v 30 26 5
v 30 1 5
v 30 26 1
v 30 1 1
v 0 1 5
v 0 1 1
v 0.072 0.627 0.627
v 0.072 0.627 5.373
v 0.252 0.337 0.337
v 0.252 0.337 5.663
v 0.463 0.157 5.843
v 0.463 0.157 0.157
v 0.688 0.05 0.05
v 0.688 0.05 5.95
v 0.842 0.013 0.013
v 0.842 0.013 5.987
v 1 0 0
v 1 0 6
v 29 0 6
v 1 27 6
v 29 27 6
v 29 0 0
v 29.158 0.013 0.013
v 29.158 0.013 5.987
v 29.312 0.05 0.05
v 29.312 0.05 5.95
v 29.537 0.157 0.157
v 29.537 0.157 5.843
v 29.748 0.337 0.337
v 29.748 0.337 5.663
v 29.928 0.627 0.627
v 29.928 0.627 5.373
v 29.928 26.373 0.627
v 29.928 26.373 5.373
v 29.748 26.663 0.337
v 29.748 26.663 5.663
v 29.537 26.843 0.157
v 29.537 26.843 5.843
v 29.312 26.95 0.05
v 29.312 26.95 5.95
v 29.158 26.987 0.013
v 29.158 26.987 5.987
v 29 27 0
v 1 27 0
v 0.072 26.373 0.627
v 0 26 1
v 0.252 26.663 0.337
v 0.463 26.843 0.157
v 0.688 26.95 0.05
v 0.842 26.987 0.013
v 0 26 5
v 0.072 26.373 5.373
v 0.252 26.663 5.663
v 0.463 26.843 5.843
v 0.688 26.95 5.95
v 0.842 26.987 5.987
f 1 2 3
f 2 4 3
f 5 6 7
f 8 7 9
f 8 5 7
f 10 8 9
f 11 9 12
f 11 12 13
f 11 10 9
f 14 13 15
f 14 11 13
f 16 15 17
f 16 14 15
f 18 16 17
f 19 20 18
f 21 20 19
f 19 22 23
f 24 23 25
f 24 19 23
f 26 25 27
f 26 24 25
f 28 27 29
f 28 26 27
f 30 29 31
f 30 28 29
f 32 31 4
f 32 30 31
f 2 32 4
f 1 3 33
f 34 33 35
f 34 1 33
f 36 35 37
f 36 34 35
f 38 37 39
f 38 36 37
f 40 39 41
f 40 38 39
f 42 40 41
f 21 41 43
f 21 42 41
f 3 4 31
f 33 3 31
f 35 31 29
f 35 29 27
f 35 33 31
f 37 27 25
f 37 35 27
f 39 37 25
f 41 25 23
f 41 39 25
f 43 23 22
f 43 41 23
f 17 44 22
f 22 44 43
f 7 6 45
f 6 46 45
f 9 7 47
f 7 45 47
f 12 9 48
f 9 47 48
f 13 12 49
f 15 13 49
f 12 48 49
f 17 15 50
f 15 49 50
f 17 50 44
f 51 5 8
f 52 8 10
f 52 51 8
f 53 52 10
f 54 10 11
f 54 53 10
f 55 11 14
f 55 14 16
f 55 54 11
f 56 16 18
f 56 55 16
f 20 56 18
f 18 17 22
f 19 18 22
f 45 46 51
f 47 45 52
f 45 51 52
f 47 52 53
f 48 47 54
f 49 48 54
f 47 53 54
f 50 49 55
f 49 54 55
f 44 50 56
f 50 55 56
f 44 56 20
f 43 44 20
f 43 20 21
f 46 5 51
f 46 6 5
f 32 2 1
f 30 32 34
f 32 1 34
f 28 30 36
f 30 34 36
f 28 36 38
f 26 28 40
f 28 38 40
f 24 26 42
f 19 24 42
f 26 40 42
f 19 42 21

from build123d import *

# Parameters (mm, degrees)
ESQUISSE1_W        = 30
ESQUISSE1_H        = 27
BOSS_EXTRU_1_DEPTH = 6
CONG_1_R           = 1


with BuildPart() as part:
    # Esquisse1 → Boss.-Extru.1 (new body)
    with BuildSketch(Plane.XY):
        with Locations((15, 13.5)):
            Rectangle(ESQUISSE1_W, ESQUISSE1_H)
    extrude(amount=BOSS_EXTRU_1_DEPTH)

    # Congé1
    cong_1_edges = [part.edges().sort_by_distance(p)[0] for p in [
        (30, 13.5, 6),
        (0, 13.5, 6),
        (30, 13.5, 0),
        (0, 13.5, 0),
        (0, 27, 3),
        (30, 27, 3),
        (30, 0, 3),
        (0, 0, 3),
    ]]
    fillet(cong_1_edges, radius=CONG_1_R)


solid = part.part
